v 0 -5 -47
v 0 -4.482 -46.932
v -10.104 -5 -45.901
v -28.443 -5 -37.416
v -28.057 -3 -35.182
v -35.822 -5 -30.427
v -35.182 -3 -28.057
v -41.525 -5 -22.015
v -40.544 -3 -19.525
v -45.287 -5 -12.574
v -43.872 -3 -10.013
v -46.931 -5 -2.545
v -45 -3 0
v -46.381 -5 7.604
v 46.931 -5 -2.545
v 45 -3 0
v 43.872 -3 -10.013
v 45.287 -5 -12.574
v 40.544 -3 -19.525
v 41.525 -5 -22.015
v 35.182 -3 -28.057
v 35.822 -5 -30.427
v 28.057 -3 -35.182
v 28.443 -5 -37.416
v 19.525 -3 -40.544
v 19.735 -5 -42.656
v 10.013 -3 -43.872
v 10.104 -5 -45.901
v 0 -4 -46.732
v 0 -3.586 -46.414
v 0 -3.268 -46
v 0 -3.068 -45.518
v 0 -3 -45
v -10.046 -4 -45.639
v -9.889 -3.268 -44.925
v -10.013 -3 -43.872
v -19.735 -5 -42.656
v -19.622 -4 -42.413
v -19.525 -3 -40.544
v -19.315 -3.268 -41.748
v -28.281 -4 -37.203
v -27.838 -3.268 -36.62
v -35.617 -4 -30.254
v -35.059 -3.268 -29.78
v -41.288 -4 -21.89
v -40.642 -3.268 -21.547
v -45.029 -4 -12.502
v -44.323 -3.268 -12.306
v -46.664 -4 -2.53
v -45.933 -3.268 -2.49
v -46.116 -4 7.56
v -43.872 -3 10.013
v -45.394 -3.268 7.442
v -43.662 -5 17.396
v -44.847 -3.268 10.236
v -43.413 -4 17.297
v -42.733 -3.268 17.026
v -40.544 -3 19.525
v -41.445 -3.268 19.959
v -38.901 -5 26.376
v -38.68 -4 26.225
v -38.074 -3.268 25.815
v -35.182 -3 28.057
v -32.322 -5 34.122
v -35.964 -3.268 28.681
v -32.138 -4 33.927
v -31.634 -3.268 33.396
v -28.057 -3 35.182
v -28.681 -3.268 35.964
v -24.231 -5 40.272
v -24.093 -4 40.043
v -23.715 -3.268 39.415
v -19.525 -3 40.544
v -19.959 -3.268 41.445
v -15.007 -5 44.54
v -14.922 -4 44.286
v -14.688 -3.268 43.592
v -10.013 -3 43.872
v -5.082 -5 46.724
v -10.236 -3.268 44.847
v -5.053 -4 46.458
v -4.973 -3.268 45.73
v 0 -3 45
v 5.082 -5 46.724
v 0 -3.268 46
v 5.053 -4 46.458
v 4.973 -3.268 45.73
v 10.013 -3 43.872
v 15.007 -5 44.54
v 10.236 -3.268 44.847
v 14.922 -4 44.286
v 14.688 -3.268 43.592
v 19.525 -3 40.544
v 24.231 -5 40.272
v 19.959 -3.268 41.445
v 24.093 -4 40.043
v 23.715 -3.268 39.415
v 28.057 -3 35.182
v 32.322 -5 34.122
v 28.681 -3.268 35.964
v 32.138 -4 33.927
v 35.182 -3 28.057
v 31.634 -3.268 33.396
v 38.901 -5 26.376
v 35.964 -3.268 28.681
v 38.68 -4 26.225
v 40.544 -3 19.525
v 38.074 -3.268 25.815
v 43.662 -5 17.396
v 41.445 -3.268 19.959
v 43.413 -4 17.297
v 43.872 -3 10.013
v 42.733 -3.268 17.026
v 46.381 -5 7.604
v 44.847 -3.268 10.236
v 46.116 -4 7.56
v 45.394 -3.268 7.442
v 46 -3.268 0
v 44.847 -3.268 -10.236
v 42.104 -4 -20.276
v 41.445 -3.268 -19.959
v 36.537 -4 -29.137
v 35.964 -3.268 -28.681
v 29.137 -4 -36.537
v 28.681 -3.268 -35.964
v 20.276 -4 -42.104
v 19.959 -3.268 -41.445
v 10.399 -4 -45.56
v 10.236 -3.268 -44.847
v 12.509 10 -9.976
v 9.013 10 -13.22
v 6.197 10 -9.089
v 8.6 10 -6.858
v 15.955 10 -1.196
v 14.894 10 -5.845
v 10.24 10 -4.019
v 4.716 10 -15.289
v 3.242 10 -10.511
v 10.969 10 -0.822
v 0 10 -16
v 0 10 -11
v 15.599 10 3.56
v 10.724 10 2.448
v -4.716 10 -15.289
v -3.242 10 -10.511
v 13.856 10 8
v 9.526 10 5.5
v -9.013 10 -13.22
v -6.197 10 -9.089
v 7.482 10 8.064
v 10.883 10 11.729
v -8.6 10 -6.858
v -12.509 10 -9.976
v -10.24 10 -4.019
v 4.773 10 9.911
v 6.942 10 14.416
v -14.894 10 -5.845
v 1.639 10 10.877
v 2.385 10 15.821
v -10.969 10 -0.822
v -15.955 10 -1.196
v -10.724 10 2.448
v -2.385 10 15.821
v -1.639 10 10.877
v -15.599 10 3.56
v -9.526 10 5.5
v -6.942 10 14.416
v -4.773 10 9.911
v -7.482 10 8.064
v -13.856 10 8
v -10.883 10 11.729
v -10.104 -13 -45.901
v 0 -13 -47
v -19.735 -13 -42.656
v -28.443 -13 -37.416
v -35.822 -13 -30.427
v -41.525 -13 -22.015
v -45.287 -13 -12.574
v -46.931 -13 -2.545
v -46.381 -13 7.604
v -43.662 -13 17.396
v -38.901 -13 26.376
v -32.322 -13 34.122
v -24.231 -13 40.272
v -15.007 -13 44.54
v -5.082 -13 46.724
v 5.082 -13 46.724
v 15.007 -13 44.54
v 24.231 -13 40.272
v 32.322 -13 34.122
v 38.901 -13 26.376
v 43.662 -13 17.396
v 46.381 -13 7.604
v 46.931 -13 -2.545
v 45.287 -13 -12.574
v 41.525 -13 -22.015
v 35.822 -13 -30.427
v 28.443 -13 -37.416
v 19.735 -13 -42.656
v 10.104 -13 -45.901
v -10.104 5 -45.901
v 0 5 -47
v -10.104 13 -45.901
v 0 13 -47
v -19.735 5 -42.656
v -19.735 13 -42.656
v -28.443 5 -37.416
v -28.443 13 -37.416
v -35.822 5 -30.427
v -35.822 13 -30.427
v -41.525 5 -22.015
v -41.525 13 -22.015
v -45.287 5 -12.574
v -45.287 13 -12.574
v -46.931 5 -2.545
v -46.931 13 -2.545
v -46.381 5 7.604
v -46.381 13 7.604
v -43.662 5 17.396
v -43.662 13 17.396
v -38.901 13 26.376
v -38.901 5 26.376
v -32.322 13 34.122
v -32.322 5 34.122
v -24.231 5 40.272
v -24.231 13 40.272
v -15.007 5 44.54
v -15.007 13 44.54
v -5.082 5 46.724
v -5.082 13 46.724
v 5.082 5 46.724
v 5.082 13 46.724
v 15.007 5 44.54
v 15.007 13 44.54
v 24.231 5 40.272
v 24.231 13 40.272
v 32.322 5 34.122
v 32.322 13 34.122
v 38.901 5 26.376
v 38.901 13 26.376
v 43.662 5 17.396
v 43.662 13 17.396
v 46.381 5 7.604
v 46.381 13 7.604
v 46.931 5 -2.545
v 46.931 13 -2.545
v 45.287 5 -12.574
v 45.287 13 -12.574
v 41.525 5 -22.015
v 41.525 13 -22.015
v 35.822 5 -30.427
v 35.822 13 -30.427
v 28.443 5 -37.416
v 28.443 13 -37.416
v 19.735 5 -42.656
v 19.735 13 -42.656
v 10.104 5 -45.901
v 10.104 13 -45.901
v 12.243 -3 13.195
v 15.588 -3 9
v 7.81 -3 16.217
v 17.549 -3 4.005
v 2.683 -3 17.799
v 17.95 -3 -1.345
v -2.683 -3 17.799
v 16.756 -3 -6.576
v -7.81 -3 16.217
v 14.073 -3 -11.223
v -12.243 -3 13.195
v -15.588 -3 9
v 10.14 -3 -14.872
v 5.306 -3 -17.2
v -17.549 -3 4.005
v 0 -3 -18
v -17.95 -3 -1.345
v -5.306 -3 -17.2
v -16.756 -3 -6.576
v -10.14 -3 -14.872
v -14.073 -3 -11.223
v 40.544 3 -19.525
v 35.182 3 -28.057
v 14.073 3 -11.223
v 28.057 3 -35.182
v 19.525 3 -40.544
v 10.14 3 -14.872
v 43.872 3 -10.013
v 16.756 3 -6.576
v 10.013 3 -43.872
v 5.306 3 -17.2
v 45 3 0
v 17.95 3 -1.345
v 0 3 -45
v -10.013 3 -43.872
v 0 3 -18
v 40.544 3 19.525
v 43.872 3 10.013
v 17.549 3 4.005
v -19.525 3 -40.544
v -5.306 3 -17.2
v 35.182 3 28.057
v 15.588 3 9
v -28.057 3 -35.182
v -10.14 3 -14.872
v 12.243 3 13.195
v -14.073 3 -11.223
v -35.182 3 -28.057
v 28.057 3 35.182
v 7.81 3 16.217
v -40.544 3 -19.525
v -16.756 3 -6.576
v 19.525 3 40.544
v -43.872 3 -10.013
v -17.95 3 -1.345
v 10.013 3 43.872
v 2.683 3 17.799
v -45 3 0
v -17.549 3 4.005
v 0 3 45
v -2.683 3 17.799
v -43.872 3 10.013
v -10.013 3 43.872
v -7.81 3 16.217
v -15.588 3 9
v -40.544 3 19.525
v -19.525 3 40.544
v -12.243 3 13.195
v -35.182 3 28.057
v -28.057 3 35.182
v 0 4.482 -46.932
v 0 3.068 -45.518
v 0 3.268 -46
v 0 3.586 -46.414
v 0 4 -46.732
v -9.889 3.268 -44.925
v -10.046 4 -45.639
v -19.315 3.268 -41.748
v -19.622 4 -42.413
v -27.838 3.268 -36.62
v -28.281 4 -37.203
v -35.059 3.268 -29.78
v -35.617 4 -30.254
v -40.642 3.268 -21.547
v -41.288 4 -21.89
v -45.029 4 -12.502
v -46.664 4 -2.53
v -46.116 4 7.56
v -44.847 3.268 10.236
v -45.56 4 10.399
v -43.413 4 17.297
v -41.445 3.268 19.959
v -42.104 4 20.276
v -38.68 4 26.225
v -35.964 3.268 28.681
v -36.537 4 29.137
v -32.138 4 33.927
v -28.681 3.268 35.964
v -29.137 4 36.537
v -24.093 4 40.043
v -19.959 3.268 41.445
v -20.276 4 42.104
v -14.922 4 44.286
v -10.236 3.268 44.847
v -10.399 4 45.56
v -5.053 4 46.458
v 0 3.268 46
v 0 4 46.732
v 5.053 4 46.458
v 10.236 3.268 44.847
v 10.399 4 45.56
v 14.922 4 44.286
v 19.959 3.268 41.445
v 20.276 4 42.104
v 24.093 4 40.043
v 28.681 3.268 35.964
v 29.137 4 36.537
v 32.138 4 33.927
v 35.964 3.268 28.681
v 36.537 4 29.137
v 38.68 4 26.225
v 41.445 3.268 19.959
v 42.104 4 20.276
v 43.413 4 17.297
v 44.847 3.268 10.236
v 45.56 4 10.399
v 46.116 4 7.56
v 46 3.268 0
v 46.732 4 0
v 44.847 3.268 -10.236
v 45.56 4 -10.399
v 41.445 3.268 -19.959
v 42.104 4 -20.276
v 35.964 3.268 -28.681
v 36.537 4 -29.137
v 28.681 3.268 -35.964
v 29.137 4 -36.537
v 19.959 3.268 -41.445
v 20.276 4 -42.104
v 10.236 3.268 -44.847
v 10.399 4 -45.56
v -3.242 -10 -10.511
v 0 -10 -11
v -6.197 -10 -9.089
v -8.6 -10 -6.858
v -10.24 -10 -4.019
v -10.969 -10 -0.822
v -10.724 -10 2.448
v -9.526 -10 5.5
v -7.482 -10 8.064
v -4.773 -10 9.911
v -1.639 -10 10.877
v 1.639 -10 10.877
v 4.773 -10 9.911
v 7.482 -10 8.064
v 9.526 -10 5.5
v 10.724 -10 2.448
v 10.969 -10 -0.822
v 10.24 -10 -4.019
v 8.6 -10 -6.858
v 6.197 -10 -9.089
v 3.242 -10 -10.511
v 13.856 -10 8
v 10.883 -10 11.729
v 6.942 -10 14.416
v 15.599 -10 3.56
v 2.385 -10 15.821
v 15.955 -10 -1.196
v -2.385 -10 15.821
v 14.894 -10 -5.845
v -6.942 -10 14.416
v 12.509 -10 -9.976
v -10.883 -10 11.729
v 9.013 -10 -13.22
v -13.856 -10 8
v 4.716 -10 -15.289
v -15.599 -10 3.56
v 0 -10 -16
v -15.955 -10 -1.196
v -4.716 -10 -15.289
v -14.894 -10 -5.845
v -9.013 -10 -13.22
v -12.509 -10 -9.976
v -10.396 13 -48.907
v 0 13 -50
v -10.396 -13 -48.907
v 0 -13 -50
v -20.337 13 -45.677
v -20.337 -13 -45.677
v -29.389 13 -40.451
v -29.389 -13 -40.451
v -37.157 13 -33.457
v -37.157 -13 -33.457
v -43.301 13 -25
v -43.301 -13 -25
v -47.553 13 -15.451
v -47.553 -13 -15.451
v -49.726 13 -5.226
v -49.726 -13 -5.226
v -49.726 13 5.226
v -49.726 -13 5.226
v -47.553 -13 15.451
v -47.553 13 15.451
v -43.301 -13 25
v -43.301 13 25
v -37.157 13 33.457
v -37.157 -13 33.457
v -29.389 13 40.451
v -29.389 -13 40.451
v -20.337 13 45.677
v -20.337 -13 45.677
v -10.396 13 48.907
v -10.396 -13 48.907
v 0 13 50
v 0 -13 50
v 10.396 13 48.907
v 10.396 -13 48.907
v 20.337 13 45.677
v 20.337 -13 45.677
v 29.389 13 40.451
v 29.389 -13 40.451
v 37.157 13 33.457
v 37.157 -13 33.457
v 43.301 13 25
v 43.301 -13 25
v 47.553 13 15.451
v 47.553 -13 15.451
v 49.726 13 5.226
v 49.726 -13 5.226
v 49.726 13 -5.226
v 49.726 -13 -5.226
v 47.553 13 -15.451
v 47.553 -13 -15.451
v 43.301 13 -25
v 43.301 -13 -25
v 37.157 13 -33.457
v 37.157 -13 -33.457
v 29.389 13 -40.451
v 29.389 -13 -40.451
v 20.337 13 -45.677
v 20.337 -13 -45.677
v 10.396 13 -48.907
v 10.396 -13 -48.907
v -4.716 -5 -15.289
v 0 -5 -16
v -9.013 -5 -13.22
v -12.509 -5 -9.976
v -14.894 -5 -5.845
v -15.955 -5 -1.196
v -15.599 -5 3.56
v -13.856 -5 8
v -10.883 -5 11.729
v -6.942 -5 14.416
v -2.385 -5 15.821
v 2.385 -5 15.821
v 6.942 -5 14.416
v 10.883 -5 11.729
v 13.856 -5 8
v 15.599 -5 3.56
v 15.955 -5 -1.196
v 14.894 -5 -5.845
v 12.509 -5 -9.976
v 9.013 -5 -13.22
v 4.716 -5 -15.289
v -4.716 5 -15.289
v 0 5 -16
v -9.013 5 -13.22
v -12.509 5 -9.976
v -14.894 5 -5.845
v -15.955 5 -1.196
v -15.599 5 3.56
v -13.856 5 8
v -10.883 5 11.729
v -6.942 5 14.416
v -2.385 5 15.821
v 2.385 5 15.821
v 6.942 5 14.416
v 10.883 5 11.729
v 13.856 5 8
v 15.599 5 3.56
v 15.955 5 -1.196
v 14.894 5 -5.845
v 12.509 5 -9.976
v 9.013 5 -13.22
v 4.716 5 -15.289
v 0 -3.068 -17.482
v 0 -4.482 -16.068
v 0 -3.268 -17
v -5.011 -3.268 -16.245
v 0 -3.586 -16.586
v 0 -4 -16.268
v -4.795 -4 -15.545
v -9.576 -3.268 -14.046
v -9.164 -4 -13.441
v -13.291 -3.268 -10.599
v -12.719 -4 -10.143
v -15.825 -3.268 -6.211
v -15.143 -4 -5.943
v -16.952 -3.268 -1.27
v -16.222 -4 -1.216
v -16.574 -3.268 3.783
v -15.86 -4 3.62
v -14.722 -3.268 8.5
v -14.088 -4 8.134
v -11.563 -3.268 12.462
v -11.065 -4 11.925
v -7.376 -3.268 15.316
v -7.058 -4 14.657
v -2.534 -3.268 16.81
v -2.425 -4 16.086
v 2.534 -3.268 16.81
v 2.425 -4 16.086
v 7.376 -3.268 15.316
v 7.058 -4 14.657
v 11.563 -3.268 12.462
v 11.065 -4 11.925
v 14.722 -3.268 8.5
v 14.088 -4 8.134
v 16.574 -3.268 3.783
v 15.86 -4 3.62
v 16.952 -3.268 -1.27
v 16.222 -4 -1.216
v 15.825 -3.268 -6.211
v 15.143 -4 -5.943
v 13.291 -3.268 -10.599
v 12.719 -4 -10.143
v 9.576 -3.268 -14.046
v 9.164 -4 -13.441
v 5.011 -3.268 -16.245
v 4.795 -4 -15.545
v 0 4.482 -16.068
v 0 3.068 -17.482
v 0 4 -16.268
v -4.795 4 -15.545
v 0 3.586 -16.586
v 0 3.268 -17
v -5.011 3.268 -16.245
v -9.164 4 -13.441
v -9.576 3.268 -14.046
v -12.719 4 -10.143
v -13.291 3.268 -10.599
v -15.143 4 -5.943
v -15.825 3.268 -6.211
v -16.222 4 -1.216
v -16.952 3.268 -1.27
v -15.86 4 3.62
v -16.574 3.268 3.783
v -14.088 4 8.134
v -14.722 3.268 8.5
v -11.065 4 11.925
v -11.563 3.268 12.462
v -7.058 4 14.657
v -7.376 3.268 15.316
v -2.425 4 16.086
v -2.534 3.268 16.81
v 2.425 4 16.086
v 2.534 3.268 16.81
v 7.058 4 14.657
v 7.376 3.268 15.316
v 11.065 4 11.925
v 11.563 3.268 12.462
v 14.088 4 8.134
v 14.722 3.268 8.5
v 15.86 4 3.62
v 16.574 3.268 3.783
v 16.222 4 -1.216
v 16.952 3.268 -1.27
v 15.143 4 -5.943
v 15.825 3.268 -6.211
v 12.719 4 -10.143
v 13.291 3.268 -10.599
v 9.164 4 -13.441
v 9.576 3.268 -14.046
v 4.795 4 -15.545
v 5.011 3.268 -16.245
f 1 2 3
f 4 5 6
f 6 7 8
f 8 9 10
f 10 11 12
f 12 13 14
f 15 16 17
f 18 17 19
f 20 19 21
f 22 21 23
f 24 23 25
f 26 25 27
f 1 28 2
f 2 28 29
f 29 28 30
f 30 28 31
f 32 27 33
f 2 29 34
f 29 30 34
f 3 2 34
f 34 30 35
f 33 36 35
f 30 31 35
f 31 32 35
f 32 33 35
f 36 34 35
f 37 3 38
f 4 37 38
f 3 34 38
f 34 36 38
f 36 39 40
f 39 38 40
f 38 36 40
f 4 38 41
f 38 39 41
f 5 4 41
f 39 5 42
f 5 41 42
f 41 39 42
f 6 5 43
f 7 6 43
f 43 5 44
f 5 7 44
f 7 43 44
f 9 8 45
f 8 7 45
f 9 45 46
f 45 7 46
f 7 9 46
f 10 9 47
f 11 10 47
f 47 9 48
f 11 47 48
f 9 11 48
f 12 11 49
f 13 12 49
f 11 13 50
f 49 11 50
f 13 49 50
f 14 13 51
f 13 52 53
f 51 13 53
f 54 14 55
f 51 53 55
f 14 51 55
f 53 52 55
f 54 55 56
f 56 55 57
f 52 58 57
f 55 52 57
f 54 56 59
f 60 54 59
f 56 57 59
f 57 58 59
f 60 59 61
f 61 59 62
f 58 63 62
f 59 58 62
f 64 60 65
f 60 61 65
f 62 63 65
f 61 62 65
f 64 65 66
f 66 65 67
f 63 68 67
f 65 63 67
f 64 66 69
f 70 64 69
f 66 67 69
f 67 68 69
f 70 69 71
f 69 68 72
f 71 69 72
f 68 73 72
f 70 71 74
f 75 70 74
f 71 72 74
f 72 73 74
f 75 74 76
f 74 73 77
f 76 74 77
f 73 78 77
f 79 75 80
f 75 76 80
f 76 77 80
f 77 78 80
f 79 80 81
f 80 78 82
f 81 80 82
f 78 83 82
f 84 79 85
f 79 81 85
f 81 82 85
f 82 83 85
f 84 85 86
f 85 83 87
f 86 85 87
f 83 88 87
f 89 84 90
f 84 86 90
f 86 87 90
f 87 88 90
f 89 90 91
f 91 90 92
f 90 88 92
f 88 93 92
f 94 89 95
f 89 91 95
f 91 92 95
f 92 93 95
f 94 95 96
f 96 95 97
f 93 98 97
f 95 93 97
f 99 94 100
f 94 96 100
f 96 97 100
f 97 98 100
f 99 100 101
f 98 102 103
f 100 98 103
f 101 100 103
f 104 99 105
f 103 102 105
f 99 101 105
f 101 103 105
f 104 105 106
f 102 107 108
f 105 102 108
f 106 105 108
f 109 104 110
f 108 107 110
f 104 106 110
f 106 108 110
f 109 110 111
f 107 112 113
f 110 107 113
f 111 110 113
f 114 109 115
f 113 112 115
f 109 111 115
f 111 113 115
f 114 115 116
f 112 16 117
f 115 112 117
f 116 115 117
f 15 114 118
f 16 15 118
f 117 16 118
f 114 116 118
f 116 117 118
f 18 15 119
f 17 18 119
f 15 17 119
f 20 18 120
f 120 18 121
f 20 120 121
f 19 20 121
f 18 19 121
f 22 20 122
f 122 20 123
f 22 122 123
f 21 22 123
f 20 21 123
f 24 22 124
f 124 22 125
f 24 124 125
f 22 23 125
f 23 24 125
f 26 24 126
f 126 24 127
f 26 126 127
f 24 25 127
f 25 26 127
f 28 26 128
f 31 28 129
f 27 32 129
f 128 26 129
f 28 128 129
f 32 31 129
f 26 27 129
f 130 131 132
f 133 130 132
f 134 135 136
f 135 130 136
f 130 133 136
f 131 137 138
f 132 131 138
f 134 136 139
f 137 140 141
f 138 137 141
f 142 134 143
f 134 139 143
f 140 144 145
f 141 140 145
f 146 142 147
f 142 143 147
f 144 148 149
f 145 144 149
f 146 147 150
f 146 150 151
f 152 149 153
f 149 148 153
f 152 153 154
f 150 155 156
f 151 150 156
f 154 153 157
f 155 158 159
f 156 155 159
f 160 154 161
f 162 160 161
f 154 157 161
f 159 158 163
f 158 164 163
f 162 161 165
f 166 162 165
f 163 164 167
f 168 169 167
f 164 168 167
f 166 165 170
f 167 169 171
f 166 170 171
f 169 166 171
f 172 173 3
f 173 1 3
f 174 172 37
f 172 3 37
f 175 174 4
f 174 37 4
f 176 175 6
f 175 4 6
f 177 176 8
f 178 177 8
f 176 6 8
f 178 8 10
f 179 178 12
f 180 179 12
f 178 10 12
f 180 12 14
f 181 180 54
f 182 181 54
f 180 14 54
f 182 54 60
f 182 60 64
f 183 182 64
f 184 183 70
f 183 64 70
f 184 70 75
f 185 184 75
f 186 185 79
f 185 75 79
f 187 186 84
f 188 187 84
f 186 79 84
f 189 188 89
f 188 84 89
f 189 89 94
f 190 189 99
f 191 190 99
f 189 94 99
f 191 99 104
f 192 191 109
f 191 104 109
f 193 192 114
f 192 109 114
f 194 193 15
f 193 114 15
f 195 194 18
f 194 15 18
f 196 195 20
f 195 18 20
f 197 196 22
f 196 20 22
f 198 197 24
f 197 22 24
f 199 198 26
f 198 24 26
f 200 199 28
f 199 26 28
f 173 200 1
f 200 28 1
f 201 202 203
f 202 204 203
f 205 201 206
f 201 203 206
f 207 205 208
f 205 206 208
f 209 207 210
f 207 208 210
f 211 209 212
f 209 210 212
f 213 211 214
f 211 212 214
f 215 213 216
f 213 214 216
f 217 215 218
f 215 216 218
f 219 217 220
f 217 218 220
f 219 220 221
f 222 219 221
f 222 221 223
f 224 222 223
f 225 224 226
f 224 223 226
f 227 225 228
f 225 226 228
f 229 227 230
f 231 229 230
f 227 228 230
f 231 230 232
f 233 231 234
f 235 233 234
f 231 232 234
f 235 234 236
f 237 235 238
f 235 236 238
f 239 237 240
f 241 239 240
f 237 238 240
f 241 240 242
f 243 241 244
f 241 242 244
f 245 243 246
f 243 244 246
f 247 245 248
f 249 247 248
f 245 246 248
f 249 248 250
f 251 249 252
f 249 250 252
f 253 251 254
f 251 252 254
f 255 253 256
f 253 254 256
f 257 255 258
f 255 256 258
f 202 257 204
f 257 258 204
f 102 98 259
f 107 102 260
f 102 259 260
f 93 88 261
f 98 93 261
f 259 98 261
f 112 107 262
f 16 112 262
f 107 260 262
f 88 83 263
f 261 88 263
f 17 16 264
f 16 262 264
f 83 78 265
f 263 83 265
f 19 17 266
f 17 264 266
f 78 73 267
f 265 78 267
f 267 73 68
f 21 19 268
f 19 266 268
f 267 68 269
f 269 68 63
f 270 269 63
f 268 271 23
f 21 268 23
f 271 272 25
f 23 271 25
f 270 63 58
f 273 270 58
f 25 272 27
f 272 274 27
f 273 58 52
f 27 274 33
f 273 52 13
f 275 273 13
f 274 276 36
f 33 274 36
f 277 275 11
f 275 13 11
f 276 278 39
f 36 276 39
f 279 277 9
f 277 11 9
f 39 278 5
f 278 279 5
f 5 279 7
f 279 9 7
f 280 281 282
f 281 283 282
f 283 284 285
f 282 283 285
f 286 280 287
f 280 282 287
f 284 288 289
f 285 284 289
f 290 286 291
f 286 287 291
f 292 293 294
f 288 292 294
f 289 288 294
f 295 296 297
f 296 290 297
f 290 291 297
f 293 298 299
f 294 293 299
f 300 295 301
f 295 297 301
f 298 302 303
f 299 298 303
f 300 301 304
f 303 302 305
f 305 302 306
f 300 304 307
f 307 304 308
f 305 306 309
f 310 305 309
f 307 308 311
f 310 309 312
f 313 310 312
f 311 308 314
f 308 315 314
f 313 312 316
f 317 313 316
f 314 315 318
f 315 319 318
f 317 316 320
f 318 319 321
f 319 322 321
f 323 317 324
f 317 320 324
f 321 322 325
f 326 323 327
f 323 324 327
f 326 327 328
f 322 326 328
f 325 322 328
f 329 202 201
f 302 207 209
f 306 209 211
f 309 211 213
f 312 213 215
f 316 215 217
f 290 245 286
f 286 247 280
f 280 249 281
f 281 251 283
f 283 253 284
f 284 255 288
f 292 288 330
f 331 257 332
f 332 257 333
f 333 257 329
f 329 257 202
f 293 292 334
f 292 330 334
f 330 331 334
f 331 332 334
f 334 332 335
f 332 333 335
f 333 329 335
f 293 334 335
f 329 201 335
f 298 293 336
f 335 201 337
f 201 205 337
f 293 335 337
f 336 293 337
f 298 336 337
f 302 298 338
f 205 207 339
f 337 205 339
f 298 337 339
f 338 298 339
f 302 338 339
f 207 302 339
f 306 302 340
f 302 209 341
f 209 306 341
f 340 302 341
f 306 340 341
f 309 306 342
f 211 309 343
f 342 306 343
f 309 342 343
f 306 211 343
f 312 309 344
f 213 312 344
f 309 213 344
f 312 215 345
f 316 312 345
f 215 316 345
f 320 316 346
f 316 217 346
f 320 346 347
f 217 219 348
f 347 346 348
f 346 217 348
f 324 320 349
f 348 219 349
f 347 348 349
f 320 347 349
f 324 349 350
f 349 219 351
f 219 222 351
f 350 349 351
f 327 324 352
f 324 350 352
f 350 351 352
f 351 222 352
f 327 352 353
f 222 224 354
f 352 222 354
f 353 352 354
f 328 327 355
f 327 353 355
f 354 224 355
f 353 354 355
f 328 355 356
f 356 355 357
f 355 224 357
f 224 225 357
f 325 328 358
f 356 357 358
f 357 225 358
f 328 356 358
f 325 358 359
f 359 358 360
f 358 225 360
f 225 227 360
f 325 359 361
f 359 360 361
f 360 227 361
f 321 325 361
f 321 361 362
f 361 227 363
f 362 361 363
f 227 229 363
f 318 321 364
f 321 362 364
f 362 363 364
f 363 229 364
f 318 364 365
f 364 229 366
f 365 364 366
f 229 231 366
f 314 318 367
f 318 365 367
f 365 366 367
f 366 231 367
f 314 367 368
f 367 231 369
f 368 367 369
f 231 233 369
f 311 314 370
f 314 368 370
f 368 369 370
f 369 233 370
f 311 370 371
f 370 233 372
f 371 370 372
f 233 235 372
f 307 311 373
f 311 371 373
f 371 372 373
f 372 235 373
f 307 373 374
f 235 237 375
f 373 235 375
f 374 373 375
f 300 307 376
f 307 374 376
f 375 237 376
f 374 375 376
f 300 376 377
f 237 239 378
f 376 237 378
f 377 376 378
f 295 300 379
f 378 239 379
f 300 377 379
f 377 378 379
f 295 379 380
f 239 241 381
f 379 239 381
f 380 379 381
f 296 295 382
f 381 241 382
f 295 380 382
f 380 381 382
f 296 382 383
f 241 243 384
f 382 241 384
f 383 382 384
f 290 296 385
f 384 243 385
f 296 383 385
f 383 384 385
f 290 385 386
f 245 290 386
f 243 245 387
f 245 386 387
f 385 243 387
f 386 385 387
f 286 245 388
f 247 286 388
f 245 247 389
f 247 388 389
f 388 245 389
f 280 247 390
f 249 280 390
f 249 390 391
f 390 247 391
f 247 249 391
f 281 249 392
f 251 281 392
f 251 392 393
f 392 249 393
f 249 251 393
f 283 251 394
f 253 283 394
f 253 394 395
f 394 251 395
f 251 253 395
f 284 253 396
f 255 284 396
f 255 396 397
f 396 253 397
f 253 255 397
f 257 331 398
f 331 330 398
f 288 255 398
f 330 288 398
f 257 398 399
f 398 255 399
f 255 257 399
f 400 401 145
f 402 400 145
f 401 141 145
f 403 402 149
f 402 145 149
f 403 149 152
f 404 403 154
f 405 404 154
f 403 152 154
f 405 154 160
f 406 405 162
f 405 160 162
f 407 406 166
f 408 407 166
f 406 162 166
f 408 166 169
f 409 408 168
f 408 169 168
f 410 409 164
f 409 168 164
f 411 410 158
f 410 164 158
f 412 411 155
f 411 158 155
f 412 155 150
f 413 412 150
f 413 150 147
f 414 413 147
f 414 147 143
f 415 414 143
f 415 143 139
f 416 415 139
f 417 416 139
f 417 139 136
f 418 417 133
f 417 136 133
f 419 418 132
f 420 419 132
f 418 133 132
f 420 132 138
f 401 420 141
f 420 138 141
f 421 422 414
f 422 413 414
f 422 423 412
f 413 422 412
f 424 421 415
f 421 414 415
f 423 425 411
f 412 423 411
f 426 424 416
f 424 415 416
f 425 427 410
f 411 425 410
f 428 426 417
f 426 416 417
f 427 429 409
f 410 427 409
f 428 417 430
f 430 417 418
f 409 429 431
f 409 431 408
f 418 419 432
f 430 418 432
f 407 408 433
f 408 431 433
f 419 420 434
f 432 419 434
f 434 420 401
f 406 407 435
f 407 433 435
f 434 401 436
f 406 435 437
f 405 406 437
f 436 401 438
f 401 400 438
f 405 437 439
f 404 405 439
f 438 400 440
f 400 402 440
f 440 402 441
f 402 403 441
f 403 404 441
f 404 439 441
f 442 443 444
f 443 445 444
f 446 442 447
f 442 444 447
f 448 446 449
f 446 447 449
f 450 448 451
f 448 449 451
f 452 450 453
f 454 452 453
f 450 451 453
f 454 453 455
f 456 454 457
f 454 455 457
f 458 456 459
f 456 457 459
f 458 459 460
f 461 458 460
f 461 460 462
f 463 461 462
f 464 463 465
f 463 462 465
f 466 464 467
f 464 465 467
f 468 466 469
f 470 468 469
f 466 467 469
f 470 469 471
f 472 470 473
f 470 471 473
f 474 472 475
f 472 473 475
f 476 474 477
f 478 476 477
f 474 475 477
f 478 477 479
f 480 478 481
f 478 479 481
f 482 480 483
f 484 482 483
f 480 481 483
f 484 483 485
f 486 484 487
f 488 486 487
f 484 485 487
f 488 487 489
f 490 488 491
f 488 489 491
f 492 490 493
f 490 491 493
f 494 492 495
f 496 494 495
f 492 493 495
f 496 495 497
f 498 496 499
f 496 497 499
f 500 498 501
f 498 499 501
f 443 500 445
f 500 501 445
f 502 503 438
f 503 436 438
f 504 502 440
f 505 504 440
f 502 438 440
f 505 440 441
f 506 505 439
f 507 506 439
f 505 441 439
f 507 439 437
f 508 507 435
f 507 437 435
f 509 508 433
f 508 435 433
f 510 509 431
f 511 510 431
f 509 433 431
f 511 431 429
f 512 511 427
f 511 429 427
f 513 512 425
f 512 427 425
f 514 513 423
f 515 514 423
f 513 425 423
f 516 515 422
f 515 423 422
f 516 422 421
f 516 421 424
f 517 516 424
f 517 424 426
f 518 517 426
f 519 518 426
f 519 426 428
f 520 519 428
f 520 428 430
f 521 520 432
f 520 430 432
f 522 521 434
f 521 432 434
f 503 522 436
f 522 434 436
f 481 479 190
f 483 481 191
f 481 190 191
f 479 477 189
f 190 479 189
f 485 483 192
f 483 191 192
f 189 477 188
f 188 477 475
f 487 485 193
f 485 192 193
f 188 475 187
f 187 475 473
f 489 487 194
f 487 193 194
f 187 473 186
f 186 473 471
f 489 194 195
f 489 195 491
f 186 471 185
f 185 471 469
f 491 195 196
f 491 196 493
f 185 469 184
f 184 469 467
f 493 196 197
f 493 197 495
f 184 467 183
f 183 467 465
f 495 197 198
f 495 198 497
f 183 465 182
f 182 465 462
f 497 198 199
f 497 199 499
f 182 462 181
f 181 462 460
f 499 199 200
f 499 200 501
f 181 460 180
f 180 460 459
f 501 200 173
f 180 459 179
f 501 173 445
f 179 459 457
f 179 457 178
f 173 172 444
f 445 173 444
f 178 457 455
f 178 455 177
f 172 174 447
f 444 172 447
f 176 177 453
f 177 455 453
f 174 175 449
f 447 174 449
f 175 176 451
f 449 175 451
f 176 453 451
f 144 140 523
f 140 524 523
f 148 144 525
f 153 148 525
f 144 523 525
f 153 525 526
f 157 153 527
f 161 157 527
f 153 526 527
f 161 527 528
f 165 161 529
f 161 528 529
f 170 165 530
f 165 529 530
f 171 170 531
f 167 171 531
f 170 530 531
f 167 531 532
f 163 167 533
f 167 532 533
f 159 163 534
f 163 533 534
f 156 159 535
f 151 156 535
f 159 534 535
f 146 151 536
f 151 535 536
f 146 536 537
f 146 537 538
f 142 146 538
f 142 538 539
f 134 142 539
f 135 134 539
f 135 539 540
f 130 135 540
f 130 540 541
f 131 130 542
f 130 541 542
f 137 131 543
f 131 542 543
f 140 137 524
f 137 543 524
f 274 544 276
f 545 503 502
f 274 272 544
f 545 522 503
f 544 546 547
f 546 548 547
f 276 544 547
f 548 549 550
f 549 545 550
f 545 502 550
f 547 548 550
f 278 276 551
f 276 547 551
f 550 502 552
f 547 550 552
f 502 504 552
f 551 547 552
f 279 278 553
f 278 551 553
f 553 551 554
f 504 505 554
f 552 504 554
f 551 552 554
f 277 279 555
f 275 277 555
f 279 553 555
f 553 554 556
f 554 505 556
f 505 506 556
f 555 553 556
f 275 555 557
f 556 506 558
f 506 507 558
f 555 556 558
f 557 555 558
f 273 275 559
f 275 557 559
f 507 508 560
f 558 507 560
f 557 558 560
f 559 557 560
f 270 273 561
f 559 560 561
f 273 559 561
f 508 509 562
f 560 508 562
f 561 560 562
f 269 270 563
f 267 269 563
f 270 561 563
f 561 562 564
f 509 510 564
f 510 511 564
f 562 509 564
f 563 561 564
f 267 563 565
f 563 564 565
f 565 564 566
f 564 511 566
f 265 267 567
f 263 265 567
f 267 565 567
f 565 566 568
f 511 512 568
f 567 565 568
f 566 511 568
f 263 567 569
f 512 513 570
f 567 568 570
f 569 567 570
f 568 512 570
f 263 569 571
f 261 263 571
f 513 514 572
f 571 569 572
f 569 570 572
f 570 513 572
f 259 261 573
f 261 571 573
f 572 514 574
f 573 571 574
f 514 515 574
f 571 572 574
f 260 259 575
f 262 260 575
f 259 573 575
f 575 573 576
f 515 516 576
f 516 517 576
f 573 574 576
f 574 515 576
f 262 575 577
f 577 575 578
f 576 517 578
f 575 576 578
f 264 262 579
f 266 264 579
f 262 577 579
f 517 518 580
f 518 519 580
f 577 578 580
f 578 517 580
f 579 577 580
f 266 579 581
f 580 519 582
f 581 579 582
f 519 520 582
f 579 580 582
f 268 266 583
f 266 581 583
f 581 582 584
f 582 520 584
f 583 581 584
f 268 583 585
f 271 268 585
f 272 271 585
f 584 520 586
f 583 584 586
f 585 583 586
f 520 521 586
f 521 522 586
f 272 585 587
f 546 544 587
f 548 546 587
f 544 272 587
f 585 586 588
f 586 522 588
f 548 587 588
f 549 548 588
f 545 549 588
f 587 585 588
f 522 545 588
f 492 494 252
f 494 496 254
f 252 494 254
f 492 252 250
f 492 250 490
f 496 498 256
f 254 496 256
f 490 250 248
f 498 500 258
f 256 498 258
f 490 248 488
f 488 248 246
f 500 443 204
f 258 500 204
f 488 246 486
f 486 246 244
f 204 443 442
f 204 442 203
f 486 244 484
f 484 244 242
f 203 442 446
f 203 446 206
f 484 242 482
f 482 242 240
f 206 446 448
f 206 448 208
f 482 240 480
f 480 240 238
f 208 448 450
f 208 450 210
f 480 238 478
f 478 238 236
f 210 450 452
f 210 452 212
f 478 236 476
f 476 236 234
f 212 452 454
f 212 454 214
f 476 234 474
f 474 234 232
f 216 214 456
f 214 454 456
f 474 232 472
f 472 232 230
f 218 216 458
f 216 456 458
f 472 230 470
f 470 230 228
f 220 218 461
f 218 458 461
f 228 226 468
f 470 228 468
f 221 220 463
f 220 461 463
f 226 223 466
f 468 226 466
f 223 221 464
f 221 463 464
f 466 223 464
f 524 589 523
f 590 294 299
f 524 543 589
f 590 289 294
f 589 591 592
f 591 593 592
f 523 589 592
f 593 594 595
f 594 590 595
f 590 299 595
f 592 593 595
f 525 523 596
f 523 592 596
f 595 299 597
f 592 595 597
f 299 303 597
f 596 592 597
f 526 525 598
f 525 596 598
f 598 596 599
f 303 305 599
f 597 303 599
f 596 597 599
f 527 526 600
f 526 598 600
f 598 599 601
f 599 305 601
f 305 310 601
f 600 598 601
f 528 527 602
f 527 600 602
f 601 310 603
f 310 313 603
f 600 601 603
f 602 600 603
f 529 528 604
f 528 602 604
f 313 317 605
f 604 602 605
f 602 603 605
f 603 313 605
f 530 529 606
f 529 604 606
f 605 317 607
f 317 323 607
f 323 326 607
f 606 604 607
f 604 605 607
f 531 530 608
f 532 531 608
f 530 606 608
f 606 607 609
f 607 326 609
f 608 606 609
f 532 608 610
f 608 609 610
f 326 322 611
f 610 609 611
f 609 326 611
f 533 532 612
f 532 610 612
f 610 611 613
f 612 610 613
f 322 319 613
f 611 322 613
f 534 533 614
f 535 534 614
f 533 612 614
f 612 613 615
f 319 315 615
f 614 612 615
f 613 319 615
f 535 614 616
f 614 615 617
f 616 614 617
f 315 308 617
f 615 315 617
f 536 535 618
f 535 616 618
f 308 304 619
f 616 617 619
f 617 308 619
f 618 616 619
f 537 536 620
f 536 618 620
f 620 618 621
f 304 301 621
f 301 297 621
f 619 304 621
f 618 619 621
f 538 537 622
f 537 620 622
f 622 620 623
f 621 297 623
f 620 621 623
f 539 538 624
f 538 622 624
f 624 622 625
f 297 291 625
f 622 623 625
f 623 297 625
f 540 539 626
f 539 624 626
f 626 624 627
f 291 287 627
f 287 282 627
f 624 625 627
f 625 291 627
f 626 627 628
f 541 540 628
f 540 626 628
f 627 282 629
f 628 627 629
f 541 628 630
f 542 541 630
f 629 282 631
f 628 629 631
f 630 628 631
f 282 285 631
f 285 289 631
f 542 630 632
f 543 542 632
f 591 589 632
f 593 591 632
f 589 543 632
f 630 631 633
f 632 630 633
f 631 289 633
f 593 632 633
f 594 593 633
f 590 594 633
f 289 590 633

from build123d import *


with BuildPart() as part:
    # Sketch1 → Revolve1 (revolve)
    with BuildSketch(Plane(origin=(0, 0, 0), x_dir=(0, 0, -1), z_dir=(1, 0, 0))):
        with BuildLine():
            Line((11, -10), (11, 10))
            Line((11, 10), (16, 10))
            Line((16, 10), (16, 5))
            ThreePointArc((16, 5), (16.585786438, 3.585786438), (18, 3))
            Line((18, 3), (45, 3))
            ThreePointArc((45, 3), (46.414213562, 3.585786438), (47, 5))
            Line((47, 5), (47, 13))
            Line((47, 13), (50, 13))
            Line((50, 13), (50, -13))
            Line((50, -13), (47, -13))
            Line((47, -13), (47, -5))
            ThreePointArc((47, -5), (46.414213562, -3.585786438), (45, -3))
            Line((45, -3), (18, -3))
            ThreePointArc((18, -3), (16.585786438, -3.585786438), (16, -5))
            Line((16, -5), (16, -10))
            Line((16, -10), (11, -10))
        make_face()
    revolve(axis=Axis((0, 0, 0), (0, 1, 0)))


solid = part.part
